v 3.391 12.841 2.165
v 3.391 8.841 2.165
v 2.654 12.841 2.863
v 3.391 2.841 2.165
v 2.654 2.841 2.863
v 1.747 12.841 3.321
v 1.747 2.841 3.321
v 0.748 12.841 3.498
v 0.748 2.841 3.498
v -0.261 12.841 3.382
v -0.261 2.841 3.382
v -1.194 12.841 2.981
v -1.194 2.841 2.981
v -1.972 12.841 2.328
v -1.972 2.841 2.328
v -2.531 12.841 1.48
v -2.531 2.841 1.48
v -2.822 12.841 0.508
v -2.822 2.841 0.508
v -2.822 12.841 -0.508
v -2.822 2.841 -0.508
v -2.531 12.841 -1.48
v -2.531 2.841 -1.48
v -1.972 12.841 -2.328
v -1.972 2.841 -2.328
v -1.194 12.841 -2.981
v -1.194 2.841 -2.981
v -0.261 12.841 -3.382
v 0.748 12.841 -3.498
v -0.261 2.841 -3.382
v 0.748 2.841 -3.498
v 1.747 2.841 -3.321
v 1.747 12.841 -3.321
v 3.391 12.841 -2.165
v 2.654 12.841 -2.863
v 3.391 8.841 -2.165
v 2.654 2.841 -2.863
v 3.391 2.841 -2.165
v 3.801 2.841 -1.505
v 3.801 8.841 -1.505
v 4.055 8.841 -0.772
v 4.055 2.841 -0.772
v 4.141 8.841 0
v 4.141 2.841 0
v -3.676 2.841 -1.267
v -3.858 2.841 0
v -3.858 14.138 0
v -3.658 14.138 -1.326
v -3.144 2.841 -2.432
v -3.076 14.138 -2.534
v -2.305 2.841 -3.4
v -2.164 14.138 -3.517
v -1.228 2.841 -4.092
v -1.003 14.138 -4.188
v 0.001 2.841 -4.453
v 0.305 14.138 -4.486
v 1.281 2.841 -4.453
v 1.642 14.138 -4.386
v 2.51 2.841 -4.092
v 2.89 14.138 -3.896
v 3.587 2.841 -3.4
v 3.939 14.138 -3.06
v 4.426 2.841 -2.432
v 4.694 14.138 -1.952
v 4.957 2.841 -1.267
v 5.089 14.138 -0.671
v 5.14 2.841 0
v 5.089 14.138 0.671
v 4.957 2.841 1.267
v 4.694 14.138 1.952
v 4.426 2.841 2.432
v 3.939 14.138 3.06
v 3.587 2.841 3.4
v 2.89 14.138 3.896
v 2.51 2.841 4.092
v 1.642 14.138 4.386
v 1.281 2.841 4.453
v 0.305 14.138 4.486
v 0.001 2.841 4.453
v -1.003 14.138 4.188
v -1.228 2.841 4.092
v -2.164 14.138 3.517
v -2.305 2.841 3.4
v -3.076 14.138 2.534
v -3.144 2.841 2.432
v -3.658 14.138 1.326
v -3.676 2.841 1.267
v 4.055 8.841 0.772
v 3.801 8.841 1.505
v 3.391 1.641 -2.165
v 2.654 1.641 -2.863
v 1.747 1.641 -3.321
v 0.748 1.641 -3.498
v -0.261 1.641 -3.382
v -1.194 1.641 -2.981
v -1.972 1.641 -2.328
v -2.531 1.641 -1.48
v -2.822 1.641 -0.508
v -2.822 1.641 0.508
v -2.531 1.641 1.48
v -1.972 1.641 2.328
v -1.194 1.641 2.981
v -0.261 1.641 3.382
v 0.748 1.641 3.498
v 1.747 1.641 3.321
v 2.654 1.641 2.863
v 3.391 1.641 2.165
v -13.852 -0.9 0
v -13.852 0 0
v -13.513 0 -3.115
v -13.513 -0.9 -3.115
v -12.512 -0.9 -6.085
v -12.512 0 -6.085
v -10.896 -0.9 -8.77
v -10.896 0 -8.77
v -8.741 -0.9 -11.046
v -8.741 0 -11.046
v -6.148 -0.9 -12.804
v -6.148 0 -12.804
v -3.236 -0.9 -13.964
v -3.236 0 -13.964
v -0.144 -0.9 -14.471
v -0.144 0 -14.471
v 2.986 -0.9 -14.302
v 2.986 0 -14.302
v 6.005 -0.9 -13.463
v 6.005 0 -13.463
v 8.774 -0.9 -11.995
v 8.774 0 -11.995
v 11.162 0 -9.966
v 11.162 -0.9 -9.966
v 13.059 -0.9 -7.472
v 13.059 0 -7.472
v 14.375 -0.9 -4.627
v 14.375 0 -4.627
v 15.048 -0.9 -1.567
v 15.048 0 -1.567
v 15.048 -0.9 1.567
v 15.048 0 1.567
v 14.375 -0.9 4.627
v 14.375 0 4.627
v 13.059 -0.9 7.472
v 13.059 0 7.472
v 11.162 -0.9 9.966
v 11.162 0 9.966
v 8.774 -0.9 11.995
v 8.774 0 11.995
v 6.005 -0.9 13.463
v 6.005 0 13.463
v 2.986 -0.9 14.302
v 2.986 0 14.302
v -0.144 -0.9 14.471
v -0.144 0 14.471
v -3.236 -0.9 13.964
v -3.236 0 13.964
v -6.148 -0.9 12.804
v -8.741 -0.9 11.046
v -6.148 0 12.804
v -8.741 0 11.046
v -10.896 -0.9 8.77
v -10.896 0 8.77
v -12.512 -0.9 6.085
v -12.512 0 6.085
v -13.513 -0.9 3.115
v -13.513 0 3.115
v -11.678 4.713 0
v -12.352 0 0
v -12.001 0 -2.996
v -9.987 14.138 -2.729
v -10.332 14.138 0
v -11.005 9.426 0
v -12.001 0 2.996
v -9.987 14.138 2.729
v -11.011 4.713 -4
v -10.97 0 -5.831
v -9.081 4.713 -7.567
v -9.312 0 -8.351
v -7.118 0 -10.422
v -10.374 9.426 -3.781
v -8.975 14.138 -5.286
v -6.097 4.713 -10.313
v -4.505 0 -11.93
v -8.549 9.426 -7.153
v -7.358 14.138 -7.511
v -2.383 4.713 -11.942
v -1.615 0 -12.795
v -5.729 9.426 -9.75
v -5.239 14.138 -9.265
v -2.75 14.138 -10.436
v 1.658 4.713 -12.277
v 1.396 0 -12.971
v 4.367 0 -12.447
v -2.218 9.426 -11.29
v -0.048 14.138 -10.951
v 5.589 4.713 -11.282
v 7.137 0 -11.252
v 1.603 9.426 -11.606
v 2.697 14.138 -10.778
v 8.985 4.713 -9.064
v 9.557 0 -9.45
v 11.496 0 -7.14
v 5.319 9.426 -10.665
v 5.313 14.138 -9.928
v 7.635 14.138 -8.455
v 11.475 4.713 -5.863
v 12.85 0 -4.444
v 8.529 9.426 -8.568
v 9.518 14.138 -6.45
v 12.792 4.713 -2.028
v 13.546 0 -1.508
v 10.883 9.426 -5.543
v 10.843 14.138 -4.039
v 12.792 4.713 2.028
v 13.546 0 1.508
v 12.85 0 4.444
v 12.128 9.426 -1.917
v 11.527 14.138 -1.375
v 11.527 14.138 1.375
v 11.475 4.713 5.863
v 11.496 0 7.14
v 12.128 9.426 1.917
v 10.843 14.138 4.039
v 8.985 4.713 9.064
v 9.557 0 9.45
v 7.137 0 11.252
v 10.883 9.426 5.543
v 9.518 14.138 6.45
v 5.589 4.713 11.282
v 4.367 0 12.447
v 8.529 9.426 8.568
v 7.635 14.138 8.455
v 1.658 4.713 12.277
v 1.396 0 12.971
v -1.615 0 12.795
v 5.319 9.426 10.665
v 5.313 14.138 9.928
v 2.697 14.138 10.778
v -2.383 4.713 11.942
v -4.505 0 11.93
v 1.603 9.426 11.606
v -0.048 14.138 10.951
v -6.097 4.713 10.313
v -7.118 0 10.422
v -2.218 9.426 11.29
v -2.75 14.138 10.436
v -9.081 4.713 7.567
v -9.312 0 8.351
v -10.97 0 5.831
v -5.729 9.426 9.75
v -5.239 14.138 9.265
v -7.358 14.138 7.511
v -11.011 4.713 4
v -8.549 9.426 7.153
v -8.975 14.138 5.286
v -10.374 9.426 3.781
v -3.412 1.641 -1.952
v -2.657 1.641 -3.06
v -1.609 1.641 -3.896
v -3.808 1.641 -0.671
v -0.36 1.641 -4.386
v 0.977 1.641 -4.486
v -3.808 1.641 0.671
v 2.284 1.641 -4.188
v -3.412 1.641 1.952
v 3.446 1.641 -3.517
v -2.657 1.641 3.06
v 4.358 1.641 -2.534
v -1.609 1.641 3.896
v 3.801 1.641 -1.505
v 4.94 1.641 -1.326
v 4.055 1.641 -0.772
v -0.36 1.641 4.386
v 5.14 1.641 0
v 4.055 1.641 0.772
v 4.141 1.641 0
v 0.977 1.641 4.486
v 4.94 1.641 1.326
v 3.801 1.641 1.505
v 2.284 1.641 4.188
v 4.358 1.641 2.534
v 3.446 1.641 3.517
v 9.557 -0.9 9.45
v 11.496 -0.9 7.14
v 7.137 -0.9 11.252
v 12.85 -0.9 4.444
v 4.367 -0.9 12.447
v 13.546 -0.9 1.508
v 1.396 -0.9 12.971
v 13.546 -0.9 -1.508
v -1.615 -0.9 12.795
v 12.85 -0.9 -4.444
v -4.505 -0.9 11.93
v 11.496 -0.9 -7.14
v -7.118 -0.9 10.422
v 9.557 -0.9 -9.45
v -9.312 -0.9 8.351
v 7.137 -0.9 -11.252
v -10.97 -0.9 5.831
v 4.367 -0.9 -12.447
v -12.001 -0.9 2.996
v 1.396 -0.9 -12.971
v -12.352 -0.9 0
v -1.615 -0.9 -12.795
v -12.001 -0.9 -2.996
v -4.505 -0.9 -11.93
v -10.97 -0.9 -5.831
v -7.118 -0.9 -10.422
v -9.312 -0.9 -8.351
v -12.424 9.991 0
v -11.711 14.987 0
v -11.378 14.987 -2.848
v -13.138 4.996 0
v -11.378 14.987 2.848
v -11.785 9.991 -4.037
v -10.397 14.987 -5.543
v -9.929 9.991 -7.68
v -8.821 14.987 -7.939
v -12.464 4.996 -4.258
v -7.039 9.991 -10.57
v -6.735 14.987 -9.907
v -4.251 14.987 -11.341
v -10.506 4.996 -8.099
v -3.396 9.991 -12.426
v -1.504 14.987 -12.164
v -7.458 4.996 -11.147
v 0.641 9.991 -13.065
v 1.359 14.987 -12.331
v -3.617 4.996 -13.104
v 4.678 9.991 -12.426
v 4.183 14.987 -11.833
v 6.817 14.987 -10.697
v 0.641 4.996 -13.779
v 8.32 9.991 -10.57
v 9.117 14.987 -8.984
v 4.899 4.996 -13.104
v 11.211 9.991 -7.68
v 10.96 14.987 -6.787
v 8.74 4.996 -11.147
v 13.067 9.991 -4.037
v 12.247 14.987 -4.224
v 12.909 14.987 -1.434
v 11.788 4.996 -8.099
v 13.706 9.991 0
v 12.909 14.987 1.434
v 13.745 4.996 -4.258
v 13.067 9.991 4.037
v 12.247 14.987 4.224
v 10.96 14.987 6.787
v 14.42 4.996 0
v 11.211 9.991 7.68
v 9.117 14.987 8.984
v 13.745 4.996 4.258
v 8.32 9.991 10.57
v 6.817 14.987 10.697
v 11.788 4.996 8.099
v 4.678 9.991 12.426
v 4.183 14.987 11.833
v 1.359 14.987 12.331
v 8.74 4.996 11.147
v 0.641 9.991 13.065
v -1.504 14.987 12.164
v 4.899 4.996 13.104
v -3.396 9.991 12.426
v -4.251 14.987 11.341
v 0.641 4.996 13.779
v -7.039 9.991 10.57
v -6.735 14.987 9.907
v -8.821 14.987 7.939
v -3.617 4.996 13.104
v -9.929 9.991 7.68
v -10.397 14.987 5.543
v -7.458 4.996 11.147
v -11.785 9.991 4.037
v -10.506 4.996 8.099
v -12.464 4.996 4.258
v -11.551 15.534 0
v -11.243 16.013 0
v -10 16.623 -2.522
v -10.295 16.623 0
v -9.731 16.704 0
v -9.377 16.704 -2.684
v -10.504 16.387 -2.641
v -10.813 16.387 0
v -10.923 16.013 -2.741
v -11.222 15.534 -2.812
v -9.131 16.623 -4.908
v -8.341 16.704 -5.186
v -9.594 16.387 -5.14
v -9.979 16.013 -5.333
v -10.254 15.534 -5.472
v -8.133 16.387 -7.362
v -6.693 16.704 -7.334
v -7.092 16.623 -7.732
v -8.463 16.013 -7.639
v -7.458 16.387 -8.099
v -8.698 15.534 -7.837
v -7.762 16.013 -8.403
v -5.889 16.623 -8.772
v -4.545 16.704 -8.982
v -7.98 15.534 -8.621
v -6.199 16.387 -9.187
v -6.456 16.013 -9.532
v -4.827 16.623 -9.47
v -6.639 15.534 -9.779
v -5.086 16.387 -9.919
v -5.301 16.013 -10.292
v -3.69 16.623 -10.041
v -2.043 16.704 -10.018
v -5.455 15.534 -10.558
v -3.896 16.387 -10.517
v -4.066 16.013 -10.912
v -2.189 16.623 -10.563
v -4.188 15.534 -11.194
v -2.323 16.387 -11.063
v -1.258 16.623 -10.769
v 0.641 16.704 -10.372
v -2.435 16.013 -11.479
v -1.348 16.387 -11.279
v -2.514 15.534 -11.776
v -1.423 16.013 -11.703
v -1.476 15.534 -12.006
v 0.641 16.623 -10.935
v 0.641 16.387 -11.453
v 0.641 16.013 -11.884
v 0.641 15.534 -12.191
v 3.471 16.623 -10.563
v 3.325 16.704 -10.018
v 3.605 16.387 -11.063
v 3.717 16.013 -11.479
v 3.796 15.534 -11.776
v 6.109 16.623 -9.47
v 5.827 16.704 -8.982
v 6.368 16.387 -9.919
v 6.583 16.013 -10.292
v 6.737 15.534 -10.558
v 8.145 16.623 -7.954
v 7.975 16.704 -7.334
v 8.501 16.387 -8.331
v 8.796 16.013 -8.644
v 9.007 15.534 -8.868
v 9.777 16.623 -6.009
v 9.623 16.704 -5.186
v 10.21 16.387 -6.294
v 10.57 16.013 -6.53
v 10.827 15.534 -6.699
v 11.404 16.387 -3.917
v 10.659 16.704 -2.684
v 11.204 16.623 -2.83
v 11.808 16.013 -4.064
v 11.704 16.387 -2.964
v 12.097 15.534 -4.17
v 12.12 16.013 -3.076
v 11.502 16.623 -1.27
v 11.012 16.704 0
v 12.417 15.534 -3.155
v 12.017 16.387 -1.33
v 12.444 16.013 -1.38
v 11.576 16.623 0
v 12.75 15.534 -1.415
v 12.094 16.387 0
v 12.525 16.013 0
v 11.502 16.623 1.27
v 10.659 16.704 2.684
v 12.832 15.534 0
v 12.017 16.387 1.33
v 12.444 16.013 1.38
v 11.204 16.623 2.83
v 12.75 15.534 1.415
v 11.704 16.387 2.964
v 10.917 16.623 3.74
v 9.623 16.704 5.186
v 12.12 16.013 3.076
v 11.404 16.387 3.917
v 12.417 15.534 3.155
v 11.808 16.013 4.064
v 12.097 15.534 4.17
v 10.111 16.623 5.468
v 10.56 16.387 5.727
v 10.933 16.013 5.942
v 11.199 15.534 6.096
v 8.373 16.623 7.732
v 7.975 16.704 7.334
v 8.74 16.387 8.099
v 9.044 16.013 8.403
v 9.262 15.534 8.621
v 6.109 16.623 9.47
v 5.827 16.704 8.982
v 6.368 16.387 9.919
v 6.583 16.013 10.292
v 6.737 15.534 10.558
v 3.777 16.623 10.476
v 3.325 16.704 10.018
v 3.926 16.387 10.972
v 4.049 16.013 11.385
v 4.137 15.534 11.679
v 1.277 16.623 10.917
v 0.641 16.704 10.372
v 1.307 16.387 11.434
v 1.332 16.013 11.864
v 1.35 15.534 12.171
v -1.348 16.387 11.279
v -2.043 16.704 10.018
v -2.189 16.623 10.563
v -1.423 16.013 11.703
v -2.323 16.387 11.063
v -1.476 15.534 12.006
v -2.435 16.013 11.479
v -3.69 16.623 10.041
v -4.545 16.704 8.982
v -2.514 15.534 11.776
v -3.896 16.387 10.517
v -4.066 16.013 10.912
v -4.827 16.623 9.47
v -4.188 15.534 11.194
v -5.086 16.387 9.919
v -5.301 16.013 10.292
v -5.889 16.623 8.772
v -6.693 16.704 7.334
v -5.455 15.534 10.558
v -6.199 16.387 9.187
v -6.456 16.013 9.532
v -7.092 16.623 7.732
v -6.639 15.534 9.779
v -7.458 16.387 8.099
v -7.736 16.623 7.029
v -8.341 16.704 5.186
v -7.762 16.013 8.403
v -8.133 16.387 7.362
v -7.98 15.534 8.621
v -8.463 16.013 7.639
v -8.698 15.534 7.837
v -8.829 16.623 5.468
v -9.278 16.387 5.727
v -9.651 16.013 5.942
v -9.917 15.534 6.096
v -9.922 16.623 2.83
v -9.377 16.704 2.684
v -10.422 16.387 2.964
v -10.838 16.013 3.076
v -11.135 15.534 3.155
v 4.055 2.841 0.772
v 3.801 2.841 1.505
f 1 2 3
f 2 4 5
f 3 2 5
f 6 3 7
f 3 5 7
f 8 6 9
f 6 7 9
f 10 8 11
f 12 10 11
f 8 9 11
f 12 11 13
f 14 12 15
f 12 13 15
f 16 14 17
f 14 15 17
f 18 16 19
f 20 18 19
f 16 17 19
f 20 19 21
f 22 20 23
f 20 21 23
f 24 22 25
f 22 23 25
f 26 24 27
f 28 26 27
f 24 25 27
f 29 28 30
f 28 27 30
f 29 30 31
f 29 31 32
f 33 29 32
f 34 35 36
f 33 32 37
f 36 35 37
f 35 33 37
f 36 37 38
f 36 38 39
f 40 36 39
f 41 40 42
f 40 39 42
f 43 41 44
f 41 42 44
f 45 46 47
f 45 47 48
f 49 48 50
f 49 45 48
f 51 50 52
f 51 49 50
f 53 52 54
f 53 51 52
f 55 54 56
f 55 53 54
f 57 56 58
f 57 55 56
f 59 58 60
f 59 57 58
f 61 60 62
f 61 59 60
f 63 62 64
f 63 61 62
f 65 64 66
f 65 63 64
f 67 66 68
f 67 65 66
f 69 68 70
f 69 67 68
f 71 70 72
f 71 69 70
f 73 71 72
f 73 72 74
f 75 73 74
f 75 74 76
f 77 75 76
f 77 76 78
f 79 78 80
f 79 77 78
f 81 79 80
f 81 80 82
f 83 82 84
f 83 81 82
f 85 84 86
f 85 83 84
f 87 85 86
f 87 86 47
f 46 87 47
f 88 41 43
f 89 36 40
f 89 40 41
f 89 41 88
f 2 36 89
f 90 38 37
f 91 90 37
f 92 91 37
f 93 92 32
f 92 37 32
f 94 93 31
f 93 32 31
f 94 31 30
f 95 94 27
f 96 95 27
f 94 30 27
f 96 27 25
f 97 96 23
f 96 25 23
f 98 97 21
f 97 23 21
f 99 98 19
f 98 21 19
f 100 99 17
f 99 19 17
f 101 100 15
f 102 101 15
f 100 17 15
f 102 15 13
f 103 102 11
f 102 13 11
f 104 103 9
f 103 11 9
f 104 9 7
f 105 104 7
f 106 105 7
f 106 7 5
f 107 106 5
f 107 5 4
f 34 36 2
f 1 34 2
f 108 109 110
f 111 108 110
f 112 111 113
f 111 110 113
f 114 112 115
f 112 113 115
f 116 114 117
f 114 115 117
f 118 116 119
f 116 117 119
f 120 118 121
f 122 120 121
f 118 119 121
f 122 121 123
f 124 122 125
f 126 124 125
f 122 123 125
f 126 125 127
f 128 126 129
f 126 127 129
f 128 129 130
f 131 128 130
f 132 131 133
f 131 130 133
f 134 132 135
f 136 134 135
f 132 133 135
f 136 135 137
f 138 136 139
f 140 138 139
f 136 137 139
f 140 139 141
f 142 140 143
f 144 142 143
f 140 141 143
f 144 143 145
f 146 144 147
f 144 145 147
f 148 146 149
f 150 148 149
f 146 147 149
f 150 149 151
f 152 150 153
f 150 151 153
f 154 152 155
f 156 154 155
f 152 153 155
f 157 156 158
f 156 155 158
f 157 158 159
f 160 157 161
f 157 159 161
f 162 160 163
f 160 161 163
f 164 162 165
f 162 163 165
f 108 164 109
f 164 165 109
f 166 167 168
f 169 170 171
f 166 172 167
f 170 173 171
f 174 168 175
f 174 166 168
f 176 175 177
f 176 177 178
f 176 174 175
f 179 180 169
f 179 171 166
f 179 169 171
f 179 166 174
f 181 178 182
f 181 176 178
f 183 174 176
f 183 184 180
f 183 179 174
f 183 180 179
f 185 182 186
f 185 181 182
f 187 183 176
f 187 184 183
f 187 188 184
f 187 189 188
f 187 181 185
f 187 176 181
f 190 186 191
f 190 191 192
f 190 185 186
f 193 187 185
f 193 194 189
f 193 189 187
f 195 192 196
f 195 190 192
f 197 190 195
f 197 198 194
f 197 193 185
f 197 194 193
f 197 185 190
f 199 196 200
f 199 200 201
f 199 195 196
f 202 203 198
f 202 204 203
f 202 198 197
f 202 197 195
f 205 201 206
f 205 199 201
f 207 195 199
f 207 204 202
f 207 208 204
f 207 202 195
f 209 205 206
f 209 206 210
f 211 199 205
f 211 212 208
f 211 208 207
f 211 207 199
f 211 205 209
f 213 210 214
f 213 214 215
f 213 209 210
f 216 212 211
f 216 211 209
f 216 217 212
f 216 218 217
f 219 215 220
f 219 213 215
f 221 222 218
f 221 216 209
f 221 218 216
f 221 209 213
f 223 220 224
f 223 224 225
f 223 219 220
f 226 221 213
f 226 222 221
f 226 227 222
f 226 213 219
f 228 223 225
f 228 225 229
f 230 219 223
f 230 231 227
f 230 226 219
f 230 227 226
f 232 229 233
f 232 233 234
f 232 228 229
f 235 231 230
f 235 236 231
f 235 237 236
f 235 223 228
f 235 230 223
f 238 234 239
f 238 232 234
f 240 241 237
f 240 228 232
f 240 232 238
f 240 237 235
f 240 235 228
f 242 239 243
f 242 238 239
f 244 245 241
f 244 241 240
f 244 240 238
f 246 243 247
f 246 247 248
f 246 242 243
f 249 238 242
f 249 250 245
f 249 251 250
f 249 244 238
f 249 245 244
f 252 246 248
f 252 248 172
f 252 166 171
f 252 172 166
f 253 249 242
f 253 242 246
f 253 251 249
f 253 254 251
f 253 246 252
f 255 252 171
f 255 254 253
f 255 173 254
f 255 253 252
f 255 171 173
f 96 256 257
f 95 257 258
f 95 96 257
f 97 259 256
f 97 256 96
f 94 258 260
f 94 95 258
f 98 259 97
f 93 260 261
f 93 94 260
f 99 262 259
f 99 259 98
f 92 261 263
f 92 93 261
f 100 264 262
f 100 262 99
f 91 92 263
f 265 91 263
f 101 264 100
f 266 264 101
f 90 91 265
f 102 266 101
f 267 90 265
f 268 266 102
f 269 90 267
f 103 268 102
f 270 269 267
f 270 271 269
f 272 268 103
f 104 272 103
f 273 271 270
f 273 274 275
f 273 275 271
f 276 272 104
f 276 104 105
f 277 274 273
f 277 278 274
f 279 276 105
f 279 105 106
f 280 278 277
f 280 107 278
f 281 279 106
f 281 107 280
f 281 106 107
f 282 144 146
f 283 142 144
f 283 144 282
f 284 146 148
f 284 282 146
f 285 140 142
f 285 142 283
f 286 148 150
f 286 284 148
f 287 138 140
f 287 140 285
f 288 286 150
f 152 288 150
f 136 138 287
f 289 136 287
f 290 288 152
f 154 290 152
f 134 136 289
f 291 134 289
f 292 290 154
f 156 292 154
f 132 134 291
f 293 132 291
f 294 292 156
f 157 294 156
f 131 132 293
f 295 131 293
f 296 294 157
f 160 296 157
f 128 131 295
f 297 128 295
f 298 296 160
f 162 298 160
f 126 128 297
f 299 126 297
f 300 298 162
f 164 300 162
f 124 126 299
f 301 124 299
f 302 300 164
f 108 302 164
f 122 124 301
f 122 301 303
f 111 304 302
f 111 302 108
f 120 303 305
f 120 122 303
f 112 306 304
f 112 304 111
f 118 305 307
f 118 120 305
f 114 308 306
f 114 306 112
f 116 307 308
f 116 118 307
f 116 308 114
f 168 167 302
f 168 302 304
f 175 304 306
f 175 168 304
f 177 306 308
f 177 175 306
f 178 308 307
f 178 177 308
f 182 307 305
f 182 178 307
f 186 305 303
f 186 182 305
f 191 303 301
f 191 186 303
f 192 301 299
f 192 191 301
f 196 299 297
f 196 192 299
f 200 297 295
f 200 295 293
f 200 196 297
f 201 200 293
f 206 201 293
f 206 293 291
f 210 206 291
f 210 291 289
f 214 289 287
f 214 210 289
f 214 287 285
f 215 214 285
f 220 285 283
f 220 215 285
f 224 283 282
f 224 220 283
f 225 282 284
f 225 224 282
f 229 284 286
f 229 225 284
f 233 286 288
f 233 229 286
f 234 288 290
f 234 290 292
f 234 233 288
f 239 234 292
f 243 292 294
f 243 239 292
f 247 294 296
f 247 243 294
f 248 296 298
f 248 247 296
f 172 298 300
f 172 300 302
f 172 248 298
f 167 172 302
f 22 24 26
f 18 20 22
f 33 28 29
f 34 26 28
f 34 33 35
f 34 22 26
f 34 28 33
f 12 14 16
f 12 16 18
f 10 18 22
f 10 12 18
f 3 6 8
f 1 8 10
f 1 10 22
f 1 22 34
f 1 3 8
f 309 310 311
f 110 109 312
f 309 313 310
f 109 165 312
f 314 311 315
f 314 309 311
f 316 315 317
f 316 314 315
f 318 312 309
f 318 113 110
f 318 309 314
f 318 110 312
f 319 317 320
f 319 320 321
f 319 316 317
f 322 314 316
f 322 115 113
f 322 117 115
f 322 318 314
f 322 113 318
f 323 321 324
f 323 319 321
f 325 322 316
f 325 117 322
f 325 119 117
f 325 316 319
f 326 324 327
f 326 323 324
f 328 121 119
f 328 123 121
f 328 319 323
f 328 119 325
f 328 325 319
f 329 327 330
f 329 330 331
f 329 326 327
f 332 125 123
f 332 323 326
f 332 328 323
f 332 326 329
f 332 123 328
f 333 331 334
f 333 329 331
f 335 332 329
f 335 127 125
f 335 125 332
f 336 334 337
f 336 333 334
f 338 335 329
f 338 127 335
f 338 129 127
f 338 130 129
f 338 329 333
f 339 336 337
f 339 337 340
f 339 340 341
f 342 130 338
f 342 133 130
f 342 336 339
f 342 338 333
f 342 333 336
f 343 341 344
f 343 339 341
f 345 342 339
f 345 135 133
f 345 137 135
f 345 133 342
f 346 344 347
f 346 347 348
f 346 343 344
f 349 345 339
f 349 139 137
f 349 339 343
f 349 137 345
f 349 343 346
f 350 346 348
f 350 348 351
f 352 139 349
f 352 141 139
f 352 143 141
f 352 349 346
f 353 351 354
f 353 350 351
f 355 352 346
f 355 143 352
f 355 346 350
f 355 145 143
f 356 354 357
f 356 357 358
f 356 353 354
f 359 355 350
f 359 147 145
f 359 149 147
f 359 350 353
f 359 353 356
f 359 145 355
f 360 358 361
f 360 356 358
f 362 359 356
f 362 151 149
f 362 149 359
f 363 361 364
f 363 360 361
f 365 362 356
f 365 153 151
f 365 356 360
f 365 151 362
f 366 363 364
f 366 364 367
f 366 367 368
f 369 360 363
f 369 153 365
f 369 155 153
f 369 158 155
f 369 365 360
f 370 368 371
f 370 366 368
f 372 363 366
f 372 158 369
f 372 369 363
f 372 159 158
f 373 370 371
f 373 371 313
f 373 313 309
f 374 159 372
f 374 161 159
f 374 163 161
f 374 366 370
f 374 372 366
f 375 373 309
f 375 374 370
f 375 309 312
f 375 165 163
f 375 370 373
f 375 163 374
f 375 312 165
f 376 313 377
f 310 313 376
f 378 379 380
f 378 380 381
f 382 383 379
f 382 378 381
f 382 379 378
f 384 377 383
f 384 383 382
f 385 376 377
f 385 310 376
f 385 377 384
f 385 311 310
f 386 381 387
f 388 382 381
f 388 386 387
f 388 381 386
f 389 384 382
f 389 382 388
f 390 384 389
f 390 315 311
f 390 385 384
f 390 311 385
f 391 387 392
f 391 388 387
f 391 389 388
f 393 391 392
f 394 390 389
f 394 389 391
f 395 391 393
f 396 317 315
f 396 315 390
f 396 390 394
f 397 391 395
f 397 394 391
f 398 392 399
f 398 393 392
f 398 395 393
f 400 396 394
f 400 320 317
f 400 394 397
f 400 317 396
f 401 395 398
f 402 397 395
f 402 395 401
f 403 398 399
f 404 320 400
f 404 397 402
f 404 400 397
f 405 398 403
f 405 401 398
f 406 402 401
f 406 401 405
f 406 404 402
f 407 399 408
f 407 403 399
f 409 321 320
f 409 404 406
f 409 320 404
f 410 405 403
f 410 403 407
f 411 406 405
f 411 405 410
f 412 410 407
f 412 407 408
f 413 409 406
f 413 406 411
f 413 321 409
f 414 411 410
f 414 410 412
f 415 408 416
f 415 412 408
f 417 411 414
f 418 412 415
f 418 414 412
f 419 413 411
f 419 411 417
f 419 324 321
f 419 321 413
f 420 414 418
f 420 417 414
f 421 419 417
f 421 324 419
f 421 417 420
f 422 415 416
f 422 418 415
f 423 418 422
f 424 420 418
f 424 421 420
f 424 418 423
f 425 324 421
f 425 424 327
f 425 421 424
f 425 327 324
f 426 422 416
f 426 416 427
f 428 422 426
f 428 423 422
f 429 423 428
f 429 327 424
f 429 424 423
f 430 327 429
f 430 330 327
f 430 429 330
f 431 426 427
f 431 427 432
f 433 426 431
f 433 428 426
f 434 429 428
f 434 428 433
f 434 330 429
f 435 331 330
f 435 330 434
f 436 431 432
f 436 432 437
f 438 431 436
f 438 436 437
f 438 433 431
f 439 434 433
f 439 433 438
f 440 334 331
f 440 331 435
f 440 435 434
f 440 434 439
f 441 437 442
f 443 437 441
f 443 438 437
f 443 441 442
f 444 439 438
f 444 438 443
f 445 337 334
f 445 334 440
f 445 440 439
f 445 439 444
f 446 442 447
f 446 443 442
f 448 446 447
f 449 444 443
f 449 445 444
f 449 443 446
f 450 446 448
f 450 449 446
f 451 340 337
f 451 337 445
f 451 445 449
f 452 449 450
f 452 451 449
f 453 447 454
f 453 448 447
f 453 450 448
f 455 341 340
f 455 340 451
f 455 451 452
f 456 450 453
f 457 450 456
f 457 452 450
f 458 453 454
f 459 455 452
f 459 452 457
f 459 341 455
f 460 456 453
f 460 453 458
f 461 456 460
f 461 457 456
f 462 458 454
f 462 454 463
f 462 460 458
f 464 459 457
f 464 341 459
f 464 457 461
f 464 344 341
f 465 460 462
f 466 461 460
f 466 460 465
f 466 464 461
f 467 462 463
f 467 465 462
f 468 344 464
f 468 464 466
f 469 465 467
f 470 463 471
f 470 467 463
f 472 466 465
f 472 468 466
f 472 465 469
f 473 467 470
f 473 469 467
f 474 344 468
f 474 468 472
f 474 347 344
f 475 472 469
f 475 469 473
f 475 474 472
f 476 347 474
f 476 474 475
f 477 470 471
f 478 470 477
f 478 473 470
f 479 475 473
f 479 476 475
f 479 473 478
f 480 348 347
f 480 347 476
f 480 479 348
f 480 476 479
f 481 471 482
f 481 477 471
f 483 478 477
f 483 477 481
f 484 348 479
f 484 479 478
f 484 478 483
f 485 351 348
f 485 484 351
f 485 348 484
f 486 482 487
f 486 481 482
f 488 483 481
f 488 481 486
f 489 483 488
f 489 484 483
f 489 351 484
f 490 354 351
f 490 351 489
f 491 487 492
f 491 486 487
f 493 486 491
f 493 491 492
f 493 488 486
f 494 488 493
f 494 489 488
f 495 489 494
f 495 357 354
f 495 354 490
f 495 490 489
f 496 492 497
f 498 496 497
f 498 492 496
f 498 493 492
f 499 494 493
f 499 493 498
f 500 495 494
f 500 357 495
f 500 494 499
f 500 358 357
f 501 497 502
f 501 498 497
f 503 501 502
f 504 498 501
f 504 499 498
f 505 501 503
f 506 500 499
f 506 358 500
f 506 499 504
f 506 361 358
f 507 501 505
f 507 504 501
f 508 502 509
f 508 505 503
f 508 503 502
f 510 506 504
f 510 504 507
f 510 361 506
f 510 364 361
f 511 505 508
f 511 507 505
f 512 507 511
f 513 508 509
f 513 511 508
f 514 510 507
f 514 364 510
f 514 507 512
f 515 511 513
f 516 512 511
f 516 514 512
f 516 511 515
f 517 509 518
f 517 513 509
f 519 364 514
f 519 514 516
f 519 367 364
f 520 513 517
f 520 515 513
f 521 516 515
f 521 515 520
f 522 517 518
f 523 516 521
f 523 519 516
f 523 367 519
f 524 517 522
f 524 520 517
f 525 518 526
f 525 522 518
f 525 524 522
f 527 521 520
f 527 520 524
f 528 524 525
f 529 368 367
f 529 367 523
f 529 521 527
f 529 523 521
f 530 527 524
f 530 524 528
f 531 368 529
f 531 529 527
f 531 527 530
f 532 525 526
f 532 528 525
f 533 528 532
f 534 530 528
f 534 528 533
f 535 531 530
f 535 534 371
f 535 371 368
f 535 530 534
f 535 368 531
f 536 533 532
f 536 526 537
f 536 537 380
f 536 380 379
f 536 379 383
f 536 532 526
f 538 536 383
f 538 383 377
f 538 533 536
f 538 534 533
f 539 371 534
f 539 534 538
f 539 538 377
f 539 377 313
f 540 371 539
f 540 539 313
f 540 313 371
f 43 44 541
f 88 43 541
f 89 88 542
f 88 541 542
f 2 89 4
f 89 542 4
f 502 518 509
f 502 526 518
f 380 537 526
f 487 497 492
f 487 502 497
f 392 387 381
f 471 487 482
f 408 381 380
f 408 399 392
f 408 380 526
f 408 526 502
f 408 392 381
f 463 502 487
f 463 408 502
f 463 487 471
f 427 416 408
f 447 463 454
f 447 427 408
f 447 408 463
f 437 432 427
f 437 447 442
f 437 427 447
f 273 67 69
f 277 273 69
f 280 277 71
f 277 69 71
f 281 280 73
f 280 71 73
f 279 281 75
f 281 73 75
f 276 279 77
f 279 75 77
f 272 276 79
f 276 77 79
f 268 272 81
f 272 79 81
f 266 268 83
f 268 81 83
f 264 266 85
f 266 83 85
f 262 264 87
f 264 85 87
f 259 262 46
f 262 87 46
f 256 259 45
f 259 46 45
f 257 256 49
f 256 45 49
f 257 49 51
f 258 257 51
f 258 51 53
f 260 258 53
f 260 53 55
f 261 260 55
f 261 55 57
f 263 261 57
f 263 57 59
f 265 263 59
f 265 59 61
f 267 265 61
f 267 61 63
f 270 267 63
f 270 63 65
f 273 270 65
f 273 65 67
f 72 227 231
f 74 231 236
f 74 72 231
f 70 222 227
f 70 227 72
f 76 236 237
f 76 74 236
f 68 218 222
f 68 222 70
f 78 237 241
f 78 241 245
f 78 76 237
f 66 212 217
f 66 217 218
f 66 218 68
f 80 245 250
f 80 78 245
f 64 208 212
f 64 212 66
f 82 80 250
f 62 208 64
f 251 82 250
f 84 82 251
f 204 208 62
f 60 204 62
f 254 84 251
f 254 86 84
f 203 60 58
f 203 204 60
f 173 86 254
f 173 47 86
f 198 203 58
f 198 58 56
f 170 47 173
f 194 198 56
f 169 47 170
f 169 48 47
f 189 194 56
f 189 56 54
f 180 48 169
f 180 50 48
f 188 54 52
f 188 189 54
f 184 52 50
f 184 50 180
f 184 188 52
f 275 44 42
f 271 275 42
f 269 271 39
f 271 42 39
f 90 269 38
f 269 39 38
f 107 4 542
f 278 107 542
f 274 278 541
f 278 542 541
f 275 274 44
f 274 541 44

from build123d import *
from build123d import SkipClean  # not in build123d's __all__

# Parameters (mm, degrees)
F2_R     = 2
F4_DEPTH = 6
F5_DEPTH = 10
F6_DEPTH = 0.9
F3_R     = 4.4988269867
F7_DEPTH = 1.2


with BuildPart() as f1:
    # F0 (on Top) → F1 (revolve)
    with BuildSketch(Plane.XY):
        Polygon((0.6408938694, 2.8410089679), (0.6408938694, 16.7043862722), (-11.46528483, 16.7043862722), (-13.8516243371, 0), (-12.3516243371, 0), (-10.3318675491, 14.1383057447), (-3.8579331173, 14.1383057447), (-3.8579331173, 2.8410089679), align=None)
    revolve(axis=Axis((0.6408938694, 3.1900271702, 0), (0, -1, 0)))

    # F2
    f2_edges = [f1.edges().sort_by_distance(p)[0] for p in [
        (12.747073, 16.704386, 0),
    ]]
    fillet(f2_edges, radius=F2_R)

    # F3 (on face) → F4 (cut)
    with BuildSketch(Plane.XZ.offset(-2.8410089679)):
        with BuildLine():
            ThreePointArc((3.3910251828, -2.1648967087), (3.9481177503, -1.1455436271), (4.1408938694, 0))
            ThreePointArc((4.1408938694, 0), (3.9481177503, 1.1455436271), (3.3910251828, 2.1648967087))
            Line((3.3910251828, 2.1648967087), (3.3910251828, -2.1648967087))
        make_face()
        with BuildLine():
            Line((3.3910251828, -2.1648967087), (3.3910251828, 2.1648967087))
            ThreePointArc((3.3910251828, 2.1648967087), (-2.8591061306, 0), (3.3910251828, -2.1648967087))
        make_face()
    extrude(amount=-F4_DEPTH, mode=Mode.SUBTRACT)

    # F3 (on face) → F5 (cut)
    with BuildSketch(Plane.XZ.offset(-2.8410089679)):
        with BuildLine():
            Line((3.3910251828, -2.1648967087), (3.3910251828, 2.1648967087))
            ThreePointArc((3.3910251828, 2.1648967087), (-2.8591061306, 0), (3.3910251828, -2.1648967087))
        make_face()
    extrude(amount=-F5_DEPTH, mode=Mode.SUBTRACT)

    # F6 (add): a face of the model
    f6_faces = [f1.faces().sort_by_distance(p)[0] for p in [
        (14.72350176, 0, 0),
    ]]
    extrude(f6_faces, amount=F6_DEPTH)

    # F3 (on face) → F7 (join)
    with BuildSketch(Plane.XZ.offset(-2.8410089679)):
        with Locations((0.6408938694, 0)):
            Circle(F3_R)
        with BuildLine():
            ThreePointArc((3.3910251828, 2.1648967087), (3.9481177503, 1.1455436271), (4.1408938694, 0))
            ThreePointArc((4.1408938694, 0), (3.9481177503, -1.1455436271), (3.3910251828, -2.1648967087))
            ThreePointArc((3.3910251828, -2.1648967087), (-2.8591061306, 0), (3.3910251828, 2.1648967087))
        make_face(mode=Mode.SUBTRACT)
    with SkipClean():  # cleaning this boolean's faces spoils the solid; the shape is the same uncleaned
        extrude(amount=F7_DEPTH)


solid = f1.part
